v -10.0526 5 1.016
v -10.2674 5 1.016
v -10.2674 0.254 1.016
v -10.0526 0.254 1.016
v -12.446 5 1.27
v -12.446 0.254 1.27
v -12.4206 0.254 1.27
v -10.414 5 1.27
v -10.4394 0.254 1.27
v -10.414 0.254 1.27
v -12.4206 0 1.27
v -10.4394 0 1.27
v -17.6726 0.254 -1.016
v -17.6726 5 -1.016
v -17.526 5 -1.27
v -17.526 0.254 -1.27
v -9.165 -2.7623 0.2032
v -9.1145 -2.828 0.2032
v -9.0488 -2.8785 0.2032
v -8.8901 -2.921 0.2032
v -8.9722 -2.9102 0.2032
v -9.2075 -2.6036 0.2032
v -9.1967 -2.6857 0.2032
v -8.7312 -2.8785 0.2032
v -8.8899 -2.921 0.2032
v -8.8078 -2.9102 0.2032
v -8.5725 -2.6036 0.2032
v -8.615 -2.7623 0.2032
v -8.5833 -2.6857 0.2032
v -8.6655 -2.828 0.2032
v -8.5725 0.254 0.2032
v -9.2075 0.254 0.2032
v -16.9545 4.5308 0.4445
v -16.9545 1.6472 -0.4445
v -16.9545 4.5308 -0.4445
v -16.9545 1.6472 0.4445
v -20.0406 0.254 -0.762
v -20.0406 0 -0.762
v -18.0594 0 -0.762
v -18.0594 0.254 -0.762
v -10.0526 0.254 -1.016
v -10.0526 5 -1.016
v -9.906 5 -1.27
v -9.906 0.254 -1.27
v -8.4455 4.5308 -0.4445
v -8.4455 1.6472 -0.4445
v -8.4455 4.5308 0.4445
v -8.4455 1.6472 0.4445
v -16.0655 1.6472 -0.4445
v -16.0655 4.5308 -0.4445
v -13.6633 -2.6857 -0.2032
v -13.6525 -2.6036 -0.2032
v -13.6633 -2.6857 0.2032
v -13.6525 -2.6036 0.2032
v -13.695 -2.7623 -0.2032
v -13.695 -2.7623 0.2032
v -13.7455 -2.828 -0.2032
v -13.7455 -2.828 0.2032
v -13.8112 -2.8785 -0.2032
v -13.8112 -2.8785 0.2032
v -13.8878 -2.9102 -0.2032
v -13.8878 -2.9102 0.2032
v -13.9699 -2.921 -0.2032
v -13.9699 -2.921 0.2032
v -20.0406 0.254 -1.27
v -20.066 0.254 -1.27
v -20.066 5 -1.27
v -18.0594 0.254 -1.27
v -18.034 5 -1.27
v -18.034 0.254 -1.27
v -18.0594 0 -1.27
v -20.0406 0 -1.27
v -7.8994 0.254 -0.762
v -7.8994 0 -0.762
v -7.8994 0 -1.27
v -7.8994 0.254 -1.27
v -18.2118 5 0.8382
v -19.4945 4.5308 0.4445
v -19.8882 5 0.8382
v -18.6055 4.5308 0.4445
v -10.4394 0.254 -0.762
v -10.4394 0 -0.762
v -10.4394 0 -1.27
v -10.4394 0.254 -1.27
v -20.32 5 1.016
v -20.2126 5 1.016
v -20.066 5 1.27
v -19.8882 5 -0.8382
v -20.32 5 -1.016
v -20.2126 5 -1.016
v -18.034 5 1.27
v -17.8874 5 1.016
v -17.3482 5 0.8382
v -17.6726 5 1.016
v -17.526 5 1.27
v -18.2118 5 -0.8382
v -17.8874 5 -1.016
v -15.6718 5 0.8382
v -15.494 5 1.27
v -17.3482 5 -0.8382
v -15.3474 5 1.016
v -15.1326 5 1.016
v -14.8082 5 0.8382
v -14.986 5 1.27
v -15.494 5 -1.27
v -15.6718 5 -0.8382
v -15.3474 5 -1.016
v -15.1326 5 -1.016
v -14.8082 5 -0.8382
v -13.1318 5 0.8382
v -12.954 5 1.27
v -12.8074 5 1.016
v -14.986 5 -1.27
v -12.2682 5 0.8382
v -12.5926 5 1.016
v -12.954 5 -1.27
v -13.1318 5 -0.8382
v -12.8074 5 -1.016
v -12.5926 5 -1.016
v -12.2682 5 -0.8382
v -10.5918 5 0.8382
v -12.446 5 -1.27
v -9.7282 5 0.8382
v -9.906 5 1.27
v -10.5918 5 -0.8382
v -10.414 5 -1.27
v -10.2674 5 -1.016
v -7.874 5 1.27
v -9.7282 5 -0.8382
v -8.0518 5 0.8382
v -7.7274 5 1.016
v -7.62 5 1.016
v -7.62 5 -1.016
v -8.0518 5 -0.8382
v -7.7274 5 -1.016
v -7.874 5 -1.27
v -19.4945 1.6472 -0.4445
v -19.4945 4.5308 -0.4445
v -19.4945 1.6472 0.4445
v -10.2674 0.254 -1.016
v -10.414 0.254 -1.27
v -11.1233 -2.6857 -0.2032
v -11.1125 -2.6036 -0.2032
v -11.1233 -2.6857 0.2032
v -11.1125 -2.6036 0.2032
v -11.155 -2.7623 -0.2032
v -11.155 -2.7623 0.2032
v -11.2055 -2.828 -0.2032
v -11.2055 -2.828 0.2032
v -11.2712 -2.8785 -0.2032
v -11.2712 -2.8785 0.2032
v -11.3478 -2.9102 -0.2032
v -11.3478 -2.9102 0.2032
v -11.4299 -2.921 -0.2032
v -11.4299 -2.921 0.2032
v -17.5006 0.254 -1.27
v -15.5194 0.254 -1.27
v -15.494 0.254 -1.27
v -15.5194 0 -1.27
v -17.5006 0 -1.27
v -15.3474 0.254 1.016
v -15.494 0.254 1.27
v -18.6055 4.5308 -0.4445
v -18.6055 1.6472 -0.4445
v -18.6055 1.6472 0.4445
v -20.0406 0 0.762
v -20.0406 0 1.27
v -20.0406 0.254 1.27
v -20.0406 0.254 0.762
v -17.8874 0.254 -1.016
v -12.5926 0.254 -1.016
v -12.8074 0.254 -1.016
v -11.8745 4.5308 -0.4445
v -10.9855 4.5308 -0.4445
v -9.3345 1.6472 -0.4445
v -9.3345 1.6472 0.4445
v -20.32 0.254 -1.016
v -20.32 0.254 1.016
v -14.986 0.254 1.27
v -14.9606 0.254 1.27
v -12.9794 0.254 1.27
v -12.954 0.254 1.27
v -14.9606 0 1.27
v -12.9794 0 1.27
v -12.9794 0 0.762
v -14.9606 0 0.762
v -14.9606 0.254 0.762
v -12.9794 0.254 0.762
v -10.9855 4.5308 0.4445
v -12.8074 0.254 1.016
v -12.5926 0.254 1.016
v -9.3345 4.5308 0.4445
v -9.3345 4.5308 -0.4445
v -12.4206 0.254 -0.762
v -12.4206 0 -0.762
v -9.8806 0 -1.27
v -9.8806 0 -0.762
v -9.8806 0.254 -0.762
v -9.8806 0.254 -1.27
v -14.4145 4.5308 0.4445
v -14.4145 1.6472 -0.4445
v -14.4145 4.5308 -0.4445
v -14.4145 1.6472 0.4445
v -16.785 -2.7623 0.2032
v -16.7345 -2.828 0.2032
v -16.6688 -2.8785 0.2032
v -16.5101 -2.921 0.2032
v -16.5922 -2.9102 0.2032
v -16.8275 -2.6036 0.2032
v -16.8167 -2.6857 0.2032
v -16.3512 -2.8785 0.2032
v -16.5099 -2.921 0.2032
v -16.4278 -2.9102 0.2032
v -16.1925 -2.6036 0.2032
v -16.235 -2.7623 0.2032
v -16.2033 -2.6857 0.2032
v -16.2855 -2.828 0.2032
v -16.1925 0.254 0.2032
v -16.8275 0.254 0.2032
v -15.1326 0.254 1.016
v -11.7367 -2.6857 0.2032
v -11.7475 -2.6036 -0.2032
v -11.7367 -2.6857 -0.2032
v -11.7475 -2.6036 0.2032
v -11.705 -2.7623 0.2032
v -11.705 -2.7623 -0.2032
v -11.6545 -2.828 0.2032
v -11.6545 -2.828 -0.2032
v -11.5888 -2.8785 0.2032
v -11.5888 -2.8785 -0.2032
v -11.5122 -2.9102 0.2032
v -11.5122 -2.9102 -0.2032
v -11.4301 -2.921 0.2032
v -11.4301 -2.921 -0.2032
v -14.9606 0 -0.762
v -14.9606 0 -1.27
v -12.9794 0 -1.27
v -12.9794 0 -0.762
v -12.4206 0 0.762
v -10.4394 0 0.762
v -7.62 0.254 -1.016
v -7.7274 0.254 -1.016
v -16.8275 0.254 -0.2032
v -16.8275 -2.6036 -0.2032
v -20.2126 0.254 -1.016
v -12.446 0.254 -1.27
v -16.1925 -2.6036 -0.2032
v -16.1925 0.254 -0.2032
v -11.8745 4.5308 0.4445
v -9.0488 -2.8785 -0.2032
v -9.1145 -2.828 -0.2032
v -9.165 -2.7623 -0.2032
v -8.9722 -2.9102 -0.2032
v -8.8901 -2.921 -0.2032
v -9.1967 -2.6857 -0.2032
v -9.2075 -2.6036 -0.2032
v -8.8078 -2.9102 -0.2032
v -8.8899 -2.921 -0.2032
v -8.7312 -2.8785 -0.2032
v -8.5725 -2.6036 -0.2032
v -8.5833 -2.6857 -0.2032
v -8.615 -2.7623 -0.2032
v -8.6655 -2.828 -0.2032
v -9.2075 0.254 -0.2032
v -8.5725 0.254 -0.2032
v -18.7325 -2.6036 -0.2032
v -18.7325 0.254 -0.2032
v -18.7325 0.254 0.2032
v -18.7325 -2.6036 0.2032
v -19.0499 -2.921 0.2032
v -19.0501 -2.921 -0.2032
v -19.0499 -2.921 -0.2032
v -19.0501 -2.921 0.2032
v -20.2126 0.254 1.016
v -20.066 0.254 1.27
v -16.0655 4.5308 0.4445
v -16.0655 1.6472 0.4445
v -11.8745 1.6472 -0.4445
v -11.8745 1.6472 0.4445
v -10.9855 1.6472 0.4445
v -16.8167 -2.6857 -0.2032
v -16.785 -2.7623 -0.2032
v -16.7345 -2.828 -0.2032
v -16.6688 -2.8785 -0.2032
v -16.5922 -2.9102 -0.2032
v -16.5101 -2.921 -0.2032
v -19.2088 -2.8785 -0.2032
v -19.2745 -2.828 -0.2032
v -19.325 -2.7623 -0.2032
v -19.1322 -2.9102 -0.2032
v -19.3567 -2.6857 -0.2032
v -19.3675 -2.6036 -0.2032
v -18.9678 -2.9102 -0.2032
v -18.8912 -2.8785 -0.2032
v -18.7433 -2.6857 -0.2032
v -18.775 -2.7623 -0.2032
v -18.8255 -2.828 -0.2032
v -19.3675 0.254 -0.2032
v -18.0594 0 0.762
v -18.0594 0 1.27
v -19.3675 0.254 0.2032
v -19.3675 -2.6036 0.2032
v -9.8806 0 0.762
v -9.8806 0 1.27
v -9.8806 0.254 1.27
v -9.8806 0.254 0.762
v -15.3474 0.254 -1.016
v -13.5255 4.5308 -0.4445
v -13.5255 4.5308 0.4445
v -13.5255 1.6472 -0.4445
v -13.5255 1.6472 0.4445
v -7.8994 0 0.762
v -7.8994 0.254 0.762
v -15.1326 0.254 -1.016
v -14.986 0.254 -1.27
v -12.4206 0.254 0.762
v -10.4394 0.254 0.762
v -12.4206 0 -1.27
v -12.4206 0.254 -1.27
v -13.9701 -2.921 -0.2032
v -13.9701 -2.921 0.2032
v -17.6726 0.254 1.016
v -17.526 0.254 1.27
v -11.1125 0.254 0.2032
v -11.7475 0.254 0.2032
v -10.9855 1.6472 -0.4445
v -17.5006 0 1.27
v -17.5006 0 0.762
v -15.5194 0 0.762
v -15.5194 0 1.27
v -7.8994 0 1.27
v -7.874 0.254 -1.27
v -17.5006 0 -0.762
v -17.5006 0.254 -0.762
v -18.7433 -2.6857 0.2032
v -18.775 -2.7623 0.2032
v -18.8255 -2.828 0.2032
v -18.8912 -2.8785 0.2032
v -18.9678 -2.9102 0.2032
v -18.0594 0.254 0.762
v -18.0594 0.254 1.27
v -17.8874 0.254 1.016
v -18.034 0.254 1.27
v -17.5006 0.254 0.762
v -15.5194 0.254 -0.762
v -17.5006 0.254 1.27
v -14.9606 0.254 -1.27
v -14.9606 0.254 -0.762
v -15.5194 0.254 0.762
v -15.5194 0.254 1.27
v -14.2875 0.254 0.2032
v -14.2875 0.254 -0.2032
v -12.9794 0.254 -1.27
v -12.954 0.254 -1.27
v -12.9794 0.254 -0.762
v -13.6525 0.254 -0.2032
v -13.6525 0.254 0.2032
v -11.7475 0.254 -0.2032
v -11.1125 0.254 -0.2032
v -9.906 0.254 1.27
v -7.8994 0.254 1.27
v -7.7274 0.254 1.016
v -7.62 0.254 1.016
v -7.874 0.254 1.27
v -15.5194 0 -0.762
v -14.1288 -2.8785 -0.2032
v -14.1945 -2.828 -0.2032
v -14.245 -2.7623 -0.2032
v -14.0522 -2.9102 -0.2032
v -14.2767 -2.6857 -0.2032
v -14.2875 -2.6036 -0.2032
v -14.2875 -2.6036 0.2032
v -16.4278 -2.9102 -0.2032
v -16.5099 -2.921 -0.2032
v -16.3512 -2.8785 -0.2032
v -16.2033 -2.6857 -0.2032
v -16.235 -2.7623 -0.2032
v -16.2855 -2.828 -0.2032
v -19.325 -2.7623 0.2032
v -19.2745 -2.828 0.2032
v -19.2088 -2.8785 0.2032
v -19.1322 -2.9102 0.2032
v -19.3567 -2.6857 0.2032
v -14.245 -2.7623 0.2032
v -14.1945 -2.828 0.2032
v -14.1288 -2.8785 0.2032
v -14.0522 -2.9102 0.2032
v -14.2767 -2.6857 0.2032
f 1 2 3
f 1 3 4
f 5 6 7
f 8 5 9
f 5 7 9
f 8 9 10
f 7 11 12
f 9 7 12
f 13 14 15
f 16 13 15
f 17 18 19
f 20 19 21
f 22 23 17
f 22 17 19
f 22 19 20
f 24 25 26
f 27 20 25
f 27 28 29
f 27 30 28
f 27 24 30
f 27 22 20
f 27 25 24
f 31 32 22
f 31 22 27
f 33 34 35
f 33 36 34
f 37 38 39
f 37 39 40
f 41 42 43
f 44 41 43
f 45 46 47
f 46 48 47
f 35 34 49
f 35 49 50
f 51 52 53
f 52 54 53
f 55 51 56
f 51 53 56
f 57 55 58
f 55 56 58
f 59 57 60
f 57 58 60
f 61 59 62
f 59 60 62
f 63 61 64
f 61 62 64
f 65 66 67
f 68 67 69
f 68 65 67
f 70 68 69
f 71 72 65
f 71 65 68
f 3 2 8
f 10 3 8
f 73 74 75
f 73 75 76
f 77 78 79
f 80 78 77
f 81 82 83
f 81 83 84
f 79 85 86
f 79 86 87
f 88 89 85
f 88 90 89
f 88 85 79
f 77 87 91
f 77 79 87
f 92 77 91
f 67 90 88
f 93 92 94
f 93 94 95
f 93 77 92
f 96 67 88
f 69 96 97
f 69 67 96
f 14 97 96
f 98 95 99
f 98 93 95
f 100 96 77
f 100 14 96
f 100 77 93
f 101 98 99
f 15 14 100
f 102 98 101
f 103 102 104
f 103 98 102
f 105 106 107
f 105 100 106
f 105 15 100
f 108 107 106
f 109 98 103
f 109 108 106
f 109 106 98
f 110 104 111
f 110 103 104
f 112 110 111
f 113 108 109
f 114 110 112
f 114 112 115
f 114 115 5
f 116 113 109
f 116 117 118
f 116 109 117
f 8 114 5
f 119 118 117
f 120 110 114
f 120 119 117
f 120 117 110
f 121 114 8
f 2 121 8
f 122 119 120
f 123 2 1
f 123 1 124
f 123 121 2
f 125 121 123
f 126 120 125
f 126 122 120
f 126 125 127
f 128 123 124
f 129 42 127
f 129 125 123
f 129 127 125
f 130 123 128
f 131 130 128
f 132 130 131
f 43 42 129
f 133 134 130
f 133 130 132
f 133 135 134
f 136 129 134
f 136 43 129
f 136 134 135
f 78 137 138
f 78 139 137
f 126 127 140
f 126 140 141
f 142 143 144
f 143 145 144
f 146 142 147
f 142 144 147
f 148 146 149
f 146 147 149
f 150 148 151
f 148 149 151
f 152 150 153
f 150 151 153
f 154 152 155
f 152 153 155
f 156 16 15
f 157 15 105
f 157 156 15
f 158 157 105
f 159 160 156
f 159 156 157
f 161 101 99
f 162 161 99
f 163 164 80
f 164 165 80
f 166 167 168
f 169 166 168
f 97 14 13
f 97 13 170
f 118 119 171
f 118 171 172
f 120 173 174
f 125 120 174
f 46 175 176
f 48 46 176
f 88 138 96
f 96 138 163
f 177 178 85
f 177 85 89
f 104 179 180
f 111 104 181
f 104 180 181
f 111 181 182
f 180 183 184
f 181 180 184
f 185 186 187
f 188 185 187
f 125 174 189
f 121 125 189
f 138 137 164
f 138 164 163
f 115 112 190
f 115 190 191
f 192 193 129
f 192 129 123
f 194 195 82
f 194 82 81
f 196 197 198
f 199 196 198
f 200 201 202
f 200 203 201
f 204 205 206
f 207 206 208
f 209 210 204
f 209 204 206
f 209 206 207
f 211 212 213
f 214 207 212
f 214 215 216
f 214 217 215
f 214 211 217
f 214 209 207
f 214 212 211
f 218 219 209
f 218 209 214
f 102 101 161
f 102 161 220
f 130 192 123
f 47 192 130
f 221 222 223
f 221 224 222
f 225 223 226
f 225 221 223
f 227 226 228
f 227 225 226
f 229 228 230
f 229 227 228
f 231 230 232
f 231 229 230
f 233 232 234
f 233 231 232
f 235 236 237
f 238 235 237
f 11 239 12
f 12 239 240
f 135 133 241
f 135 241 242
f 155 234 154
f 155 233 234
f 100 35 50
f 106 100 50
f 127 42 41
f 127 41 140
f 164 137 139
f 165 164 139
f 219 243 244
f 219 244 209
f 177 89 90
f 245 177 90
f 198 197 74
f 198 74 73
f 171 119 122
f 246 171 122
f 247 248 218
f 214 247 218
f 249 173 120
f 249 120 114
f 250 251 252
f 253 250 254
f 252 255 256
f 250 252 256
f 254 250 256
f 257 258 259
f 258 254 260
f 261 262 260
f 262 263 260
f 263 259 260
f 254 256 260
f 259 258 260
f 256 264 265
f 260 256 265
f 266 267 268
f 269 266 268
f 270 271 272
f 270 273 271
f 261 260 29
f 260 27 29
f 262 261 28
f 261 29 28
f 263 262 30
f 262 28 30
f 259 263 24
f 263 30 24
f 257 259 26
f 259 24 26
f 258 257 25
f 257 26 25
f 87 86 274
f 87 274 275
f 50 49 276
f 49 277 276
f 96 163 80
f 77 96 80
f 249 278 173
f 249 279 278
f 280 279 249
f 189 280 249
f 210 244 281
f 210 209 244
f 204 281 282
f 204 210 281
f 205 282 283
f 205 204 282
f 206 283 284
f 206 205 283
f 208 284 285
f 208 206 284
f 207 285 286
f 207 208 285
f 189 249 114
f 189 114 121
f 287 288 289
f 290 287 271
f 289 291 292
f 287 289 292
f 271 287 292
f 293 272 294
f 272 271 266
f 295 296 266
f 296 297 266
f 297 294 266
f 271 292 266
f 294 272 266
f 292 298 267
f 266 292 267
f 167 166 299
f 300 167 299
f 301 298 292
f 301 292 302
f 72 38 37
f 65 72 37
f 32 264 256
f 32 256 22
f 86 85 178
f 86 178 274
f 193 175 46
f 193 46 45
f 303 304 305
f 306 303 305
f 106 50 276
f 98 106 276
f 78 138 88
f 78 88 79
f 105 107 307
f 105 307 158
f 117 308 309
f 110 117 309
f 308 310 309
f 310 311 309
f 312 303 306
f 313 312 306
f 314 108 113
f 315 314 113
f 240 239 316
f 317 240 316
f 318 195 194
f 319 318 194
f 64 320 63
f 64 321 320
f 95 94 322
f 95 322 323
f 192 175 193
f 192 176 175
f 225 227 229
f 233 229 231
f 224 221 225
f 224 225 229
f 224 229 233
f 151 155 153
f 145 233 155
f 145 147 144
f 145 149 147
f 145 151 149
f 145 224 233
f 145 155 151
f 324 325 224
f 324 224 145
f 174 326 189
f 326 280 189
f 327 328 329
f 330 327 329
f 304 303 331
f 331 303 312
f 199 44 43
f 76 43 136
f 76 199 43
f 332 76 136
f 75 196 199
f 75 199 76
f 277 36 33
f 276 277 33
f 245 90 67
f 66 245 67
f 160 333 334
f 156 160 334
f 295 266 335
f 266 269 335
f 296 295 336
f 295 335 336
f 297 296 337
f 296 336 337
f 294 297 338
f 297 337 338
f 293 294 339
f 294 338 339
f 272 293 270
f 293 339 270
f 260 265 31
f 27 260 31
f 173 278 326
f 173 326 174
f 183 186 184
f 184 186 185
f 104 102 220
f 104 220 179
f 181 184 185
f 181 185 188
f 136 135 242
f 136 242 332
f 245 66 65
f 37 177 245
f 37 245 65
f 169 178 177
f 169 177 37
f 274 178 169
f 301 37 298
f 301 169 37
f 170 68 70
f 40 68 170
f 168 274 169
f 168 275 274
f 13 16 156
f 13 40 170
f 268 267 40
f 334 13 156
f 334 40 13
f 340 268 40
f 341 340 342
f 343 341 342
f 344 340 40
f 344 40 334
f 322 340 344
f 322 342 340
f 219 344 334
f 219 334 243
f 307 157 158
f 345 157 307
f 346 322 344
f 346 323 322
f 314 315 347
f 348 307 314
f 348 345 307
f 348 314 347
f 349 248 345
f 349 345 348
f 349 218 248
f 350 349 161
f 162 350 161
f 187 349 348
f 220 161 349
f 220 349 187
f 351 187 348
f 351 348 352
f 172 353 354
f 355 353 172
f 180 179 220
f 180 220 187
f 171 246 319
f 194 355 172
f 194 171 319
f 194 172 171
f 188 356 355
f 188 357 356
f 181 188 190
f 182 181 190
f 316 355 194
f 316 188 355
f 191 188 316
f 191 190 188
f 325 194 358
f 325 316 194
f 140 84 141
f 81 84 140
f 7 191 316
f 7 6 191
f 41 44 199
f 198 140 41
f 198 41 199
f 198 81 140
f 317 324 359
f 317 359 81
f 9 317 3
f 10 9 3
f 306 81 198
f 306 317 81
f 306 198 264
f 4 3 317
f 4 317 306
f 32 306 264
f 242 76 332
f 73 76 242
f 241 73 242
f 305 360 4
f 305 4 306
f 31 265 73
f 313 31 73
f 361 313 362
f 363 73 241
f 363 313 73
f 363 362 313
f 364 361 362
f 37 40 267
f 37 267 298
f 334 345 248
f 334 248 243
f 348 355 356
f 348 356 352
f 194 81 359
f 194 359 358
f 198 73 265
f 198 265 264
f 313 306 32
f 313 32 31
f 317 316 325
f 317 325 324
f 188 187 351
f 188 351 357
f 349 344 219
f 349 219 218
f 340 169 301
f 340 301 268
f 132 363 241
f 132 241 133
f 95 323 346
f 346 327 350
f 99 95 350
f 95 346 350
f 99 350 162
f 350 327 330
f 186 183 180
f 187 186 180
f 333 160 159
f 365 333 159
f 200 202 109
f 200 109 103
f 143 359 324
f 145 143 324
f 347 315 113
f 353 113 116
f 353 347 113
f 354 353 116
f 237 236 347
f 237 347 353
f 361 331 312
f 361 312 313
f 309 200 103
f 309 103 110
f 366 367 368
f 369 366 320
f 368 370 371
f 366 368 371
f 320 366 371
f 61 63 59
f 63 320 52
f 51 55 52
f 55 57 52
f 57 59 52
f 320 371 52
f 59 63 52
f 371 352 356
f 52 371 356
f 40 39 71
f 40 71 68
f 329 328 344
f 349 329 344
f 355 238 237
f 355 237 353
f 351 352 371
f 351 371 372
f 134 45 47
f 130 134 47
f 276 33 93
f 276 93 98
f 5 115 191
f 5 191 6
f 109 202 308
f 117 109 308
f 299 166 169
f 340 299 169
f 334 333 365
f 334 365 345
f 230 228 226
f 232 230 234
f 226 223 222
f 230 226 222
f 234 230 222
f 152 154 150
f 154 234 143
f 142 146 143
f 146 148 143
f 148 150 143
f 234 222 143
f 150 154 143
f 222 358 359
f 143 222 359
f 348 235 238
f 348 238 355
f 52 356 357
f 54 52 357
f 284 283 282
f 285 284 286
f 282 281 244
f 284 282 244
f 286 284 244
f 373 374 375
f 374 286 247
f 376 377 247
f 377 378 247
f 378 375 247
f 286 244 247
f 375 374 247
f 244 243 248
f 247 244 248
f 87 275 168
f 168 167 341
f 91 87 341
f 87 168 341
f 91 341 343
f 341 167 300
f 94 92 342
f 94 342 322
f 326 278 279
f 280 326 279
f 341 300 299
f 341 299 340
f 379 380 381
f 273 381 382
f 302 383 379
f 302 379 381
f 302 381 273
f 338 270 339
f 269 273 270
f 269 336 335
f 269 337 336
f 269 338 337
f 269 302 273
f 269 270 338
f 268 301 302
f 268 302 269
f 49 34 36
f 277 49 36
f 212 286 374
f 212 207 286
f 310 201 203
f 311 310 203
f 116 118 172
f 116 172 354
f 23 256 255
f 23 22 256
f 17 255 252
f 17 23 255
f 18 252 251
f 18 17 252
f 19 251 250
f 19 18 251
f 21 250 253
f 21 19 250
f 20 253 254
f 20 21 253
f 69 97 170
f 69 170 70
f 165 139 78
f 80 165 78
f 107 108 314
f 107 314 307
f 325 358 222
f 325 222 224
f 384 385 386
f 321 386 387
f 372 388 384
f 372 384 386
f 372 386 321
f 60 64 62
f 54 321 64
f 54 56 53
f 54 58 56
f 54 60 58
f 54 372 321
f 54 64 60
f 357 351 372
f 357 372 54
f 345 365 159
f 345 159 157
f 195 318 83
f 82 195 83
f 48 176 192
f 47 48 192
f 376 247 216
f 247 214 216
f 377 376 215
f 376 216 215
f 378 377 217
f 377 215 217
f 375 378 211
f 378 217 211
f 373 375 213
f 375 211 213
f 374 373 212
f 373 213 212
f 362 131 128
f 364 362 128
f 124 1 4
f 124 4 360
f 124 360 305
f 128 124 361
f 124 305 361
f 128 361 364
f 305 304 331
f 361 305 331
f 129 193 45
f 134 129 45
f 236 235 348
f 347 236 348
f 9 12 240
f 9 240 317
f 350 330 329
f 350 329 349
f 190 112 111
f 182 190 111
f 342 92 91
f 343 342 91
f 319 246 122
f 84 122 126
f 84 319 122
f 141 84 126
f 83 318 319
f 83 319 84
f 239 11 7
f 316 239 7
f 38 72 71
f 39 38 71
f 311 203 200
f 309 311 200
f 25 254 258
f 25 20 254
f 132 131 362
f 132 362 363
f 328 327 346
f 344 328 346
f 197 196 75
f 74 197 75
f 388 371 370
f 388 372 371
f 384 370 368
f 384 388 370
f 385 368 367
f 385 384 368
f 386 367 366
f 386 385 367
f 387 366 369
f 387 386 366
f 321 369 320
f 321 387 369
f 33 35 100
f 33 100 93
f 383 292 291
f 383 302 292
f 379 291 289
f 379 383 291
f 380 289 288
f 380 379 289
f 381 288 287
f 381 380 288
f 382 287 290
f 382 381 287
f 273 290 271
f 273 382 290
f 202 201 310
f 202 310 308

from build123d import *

# Parameters (mm, degrees)
SKETCH1_W                      = 40.64
SKETCH1_H                      = 2.54
BASE_EXTRUDE_DEPTH             = 5
SKETCH2_W                      = 1.524
SKETCH2_H                      = 0.254
STANDOFF_WIDTH_DEPTH           = 41.966114046
UPPER_START                    = -19.4945
UPPER_CORE_OUTLINE_W           = 3.3528
UPPER_CORE_OUTLINE_H           = 0.889
UPPER_CORE_DEPTH               = 0.889
LEAD_IN_SIZE                   = 0.3937
LEAD_IN_SIZE2                  = 0.469193389
CORE_PATTERN_COUNT             = 16
CORE_PATTERN_PITCH             = 2.54
LEAD_IN_OF_CORE_PATTERN_SIZE2  = 0.469193389
LEAD_IN_OF_CORE_PATTERN_SIZE   = 0.3937
POSITION_CUT_DEPTH             = 21.964620197
SKETCH10_W                     = 0.2794
SKETCH10_H                     = 0.254
STANDOFF_LENGTH_DEPTH          = 22.07970588
STANDOFF_PATTERN_COUNT         = 16
STANDOFF_PATTERN_PITCH         = 2.54
SKETCH11_W                     = 0.635
SKETCH11_H                     = 0.4064
TAIL_DEPTH                     = 3.175
TAIL_FILLETS_R                 = 0.3175
TAIL_PATTERN_COUNT             = 16
TAIL_PATTERN_PITCH             = 2.54
TAIL_FILLETS_OF_TAIL_PATTERN_R = 0.3175
SKETCH12_W                     = 27.94
SKETCH12_H                     = 7.921
CUT_EXTRUDE1_DEPTH             = 22.07970588


# Read off the part's stored shape, not the designer's step: Upper Core
with BuildPart() as part:
    # Sketch1 → Base-Extrude (new body)
    with BuildSketch(Plane(origin=(0, 0, 0), x_dir=(1, 0, 0), z_dir=(0, 1, 0))):
        Rectangle(SKETCH1_W, SKETCH1_H)
    extrude(amount=BASE_EXTRUDE_DEPTH)

    # Sketch2 → Standoff - Width (cut, through all)
    with BuildSketch(Plane.ZY.offset(20.32)):
        with Locations((0, 0.127)):
            Rectangle(SKETCH2_W, SKETCH2_H)
    extrude(amount=-STANDOFF_WIDTH_DEPTH, mode=Mode.SUBTRACT)

    # Upper Core outline → Upper Core (cut)
    with BuildSketch(Plane.YZ.offset(UPPER_START)):
        with Locations((3.3236, 0)):
            Rectangle(UPPER_CORE_OUTLINE_W, UPPER_CORE_OUTLINE_H)
    upper_core = extrude(amount=UPPER_CORE_DEPTH, mode=Mode.SUBTRACT)

    # Lead-in
    lead_in_edges = [part.edges().sort_by_distance(p)[0] for p in [
        (-19.4945, 5, 0),
        (-19.05, 5, 0.4445),
        (-18.6055, 5, 0),
        (-19.05, 5, -0.4445),
    ]]
    lead_in_side = [part.faces().sort_by_distance(p)[0] for p in [
        (0.146976854, 5, 0),
    ]]
    chamfer(lead_in_edges, length=LEAD_IN_SIZE, length2=LEAD_IN_SIZE2, reference=lead_in_side[0])

    # Core Pattern: Upper Core ×16
    with Locations(*[(i * CORE_PATTERN_PITCH, 0, 0) for i in range(1, CORE_PATTERN_COUNT)]):
        add(upper_core, mode=Mode.SUBTRACT)

    # Lead-in of Core Pattern
    lead_in_of_core_pattern_edges = [part.edges().sort_by_distance(p)[0] for p in [
        (-16.9545, 5, 0),
        (-16.51, 5, 0.4445),
        (-16.0655, 5, 0),
        (-16.51, 5, -0.4445),
        (-14.4145, 5, 0),
        (-13.97, 5, 0.4445),
        (-13.5255, 5, 0),
        (-13.97, 5, -0.4445),
        (-11.8745, 5, 0),
        (-11.43, 5, 0.4445),
        (-10.9855, 5, 0),
        (-11.43, 5, -0.4445),
        (-9.3345, 5, 0),
        (-8.89, 5, 0.4445),
        (-8.4455, 5, 0),
        (-8.89, 5, -0.4445),
        (-6.7945, 5, 0),
        (-6.35, 5, 0.4445),
        (-5.9055, 5, 0),
        (-6.35, 5, -0.4445),
        (-4.2545, 5, 0),
        (-3.81, 5, 0.4445),
        (-3.3655, 5, 0),
        (-3.81, 5, -0.4445),
        (-1.7145, 5, 0),
        (-1.27, 5, 0.4445),
        (-0.8255, 5, 0),
        (-1.27, 5, -0.4445),
        (0.8255, 5, 0),
        (1.27, 5, 0.4445),
        (1.7145, 5, 0),
        (1.27, 5, -0.4445),
        (3.3655, 5, 0),
        (3.81, 5, 0.4445),
        (4.2545, 5, 0),
        (3.81, 5, -0.4445),
        (5.9055, 5, 0),
        (6.35, 5, 0.4445),
        (6.7945, 5, 0),
        (6.35, 5, -0.4445),
        (8.4455, 5, 0),
        (8.89, 5, 0.4445),
        (9.3345, 5, 0),
        (8.89, 5, -0.4445),
        (10.9855, 5, 0),
        (11.43, 5, 0.4445),
        (11.8745, 5, 0),
        (11.43, 5, -0.4445),
        (13.5255, 5, 0),
        (13.97, 5, 0.4445),
        (14.4145, 5, 0),
        (13.97, 5, -0.4445),
        (16.0655, 5, 0),
        (16.51, 5, 0.4445),
        (16.9545, 5, 0),
        (16.51, 5, -0.4445),
        (18.6055, 5, 0),
        (19.05, 5, 0.4445),
        (19.4945, 5, 0),
        (19.05, 5, -0.4445),
    ]]
    chamfer(lead_in_of_core_pattern_edges, length=LEAD_IN_OF_CORE_PATTERN_SIZE, length2=LEAD_IN_OF_CORE_PATTERN_SIZE2)

    # Sketch4 → Position Cut (cut, through all)
    with BuildSketch(Plane(origin=(0, 5, 0), x_dir=(-1, 0, 0), z_dir=(0, 1, 0))):
        Polygon((20.32, 1.016), (20.212646968, 1.016), (20.066, 1.27), (20.32, 1.27), align=None)
        Polygon((20.066, -1.27), (20.32, -1.27), (20.32, -1.016), (20.212646968, -1.016), align=None)
        Polygon((17.78, -1.016), (17.887353032, -1.016), (18.034, -1.27), (17.78, -1.27), align=None)
        Polygon((18.034, 1.27), (17.78, 1.27), (17.78, 1.016), (17.887353032, 1.016), align=None)
    position_cut = extrude(amount=-POSITION_CUT_DEPTH, mode=Mode.SUBTRACT)

    # Sketch10 → Standoff - Length (cut, through all)
    with BuildSketch(Plane.XY.offset(1.27)):
        with Locations((-17.9197, 0.127)):
            Rectangle(SKETCH10_W, SKETCH10_H)
        with Locations((-20.1803, 0.127)):
            Rectangle(SKETCH10_W, SKETCH10_H)
    standoff_length = extrude(amount=-STANDOFF_LENGTH_DEPTH, mode=Mode.SUBTRACT)

    # Standoff Pattern: Position Cut, Standoff - Length ×16
    with Locations(*[(i * STANDOFF_PATTERN_PITCH, 0, 0) for i in range(1, STANDOFF_PATTERN_COUNT)]):
        add(position_cut, mode=Mode.SUBTRACT)
        add(standoff_length, mode=Mode.SUBTRACT)

    # Sketch11 → Tail (add)
    with BuildSketch(Plane.XZ.offset(-0.254)):
        with Locations((-19.05, 0)):
            Rectangle(SKETCH11_W, SKETCH11_H)
    tail = extrude(amount=TAIL_DEPTH)

    # Tail Fillets
    tail_fillets_edges = [part.edges().sort_by_distance(p)[0] for p in [
        (-19.3675, -2.921, 0),
        (-18.7325, -2.921, 0),
    ]]
    fillet(tail_fillets_edges, radius=TAIL_FILLETS_R - 0.0001)  # a hair under: the kernel refuses the full size

    # Tail Pattern: Tail ×16
    with Locations(*[(i * TAIL_PATTERN_PITCH, 0, 0) for i in range(1, TAIL_PATTERN_COUNT)]):
        add(tail)

    # Tail Fillets of Tail Pattern
    tail_fillets_of_tail_pattern_edges = [part.edges().sort_by_distance(p)[0] for p in [
        (-16.8275, -2.921, 0),
        (-16.1925, -2.921, 0),
        (-14.2875, -2.921, 0),
        (-13.6525, -2.921, 0),
        (-11.7475, -2.921, 0),
        (-11.1125, -2.921, 0),
        (-9.2075, -2.921, 0),
        (-8.5725, -2.921, 0),
        (-6.6675, -2.921, 0),
        (-6.0325, -2.921, 0),
        (-4.1275, -2.921, 0),
        (-3.4925, -2.921, 0),
        (-1.5875, -2.921, 0),
        (-0.9525, -2.921, 0),
        (0.9525, -2.921, 0),
        (1.5875, -2.921, 0),
        (3.4925, -2.921, 0),
        (4.1275, -2.921, 0),
        (6.0325, -2.921, 0),
        (6.6675, -2.921, 0),
        (8.5725, -2.921, 0),
        (9.2075, -2.921, 0),
        (11.1125, -2.921, 0),
        (11.7475, -2.921, 0),
        (13.6525, -2.921, 0),
        (14.2875, -2.921, 0),
        (16.1925, -2.921, 0),
        (16.8275, -2.921, 0),
        (18.7325, -2.921, 0),
        (19.3675, -2.921, 0),
    ]]
    fillet(tail_fillets_of_tail_pattern_edges, radius=TAIL_FILLETS_OF_TAIL_PATTERN_R - 0.0001)  # a hair under: the kernel refuses the full size

    # Sketch12 → Cut-Extrude1 (cut, through all)
    with BuildSketch(Plane.XY.offset(1.27)):
        with Locations((6.35, 1.0395)):
            Rectangle(SKETCH12_W, SKETCH12_H)
    extrude(amount=-CUT_EXTRUDE1_DEPTH, mode=Mode.SUBTRACT)


solid = part.part
